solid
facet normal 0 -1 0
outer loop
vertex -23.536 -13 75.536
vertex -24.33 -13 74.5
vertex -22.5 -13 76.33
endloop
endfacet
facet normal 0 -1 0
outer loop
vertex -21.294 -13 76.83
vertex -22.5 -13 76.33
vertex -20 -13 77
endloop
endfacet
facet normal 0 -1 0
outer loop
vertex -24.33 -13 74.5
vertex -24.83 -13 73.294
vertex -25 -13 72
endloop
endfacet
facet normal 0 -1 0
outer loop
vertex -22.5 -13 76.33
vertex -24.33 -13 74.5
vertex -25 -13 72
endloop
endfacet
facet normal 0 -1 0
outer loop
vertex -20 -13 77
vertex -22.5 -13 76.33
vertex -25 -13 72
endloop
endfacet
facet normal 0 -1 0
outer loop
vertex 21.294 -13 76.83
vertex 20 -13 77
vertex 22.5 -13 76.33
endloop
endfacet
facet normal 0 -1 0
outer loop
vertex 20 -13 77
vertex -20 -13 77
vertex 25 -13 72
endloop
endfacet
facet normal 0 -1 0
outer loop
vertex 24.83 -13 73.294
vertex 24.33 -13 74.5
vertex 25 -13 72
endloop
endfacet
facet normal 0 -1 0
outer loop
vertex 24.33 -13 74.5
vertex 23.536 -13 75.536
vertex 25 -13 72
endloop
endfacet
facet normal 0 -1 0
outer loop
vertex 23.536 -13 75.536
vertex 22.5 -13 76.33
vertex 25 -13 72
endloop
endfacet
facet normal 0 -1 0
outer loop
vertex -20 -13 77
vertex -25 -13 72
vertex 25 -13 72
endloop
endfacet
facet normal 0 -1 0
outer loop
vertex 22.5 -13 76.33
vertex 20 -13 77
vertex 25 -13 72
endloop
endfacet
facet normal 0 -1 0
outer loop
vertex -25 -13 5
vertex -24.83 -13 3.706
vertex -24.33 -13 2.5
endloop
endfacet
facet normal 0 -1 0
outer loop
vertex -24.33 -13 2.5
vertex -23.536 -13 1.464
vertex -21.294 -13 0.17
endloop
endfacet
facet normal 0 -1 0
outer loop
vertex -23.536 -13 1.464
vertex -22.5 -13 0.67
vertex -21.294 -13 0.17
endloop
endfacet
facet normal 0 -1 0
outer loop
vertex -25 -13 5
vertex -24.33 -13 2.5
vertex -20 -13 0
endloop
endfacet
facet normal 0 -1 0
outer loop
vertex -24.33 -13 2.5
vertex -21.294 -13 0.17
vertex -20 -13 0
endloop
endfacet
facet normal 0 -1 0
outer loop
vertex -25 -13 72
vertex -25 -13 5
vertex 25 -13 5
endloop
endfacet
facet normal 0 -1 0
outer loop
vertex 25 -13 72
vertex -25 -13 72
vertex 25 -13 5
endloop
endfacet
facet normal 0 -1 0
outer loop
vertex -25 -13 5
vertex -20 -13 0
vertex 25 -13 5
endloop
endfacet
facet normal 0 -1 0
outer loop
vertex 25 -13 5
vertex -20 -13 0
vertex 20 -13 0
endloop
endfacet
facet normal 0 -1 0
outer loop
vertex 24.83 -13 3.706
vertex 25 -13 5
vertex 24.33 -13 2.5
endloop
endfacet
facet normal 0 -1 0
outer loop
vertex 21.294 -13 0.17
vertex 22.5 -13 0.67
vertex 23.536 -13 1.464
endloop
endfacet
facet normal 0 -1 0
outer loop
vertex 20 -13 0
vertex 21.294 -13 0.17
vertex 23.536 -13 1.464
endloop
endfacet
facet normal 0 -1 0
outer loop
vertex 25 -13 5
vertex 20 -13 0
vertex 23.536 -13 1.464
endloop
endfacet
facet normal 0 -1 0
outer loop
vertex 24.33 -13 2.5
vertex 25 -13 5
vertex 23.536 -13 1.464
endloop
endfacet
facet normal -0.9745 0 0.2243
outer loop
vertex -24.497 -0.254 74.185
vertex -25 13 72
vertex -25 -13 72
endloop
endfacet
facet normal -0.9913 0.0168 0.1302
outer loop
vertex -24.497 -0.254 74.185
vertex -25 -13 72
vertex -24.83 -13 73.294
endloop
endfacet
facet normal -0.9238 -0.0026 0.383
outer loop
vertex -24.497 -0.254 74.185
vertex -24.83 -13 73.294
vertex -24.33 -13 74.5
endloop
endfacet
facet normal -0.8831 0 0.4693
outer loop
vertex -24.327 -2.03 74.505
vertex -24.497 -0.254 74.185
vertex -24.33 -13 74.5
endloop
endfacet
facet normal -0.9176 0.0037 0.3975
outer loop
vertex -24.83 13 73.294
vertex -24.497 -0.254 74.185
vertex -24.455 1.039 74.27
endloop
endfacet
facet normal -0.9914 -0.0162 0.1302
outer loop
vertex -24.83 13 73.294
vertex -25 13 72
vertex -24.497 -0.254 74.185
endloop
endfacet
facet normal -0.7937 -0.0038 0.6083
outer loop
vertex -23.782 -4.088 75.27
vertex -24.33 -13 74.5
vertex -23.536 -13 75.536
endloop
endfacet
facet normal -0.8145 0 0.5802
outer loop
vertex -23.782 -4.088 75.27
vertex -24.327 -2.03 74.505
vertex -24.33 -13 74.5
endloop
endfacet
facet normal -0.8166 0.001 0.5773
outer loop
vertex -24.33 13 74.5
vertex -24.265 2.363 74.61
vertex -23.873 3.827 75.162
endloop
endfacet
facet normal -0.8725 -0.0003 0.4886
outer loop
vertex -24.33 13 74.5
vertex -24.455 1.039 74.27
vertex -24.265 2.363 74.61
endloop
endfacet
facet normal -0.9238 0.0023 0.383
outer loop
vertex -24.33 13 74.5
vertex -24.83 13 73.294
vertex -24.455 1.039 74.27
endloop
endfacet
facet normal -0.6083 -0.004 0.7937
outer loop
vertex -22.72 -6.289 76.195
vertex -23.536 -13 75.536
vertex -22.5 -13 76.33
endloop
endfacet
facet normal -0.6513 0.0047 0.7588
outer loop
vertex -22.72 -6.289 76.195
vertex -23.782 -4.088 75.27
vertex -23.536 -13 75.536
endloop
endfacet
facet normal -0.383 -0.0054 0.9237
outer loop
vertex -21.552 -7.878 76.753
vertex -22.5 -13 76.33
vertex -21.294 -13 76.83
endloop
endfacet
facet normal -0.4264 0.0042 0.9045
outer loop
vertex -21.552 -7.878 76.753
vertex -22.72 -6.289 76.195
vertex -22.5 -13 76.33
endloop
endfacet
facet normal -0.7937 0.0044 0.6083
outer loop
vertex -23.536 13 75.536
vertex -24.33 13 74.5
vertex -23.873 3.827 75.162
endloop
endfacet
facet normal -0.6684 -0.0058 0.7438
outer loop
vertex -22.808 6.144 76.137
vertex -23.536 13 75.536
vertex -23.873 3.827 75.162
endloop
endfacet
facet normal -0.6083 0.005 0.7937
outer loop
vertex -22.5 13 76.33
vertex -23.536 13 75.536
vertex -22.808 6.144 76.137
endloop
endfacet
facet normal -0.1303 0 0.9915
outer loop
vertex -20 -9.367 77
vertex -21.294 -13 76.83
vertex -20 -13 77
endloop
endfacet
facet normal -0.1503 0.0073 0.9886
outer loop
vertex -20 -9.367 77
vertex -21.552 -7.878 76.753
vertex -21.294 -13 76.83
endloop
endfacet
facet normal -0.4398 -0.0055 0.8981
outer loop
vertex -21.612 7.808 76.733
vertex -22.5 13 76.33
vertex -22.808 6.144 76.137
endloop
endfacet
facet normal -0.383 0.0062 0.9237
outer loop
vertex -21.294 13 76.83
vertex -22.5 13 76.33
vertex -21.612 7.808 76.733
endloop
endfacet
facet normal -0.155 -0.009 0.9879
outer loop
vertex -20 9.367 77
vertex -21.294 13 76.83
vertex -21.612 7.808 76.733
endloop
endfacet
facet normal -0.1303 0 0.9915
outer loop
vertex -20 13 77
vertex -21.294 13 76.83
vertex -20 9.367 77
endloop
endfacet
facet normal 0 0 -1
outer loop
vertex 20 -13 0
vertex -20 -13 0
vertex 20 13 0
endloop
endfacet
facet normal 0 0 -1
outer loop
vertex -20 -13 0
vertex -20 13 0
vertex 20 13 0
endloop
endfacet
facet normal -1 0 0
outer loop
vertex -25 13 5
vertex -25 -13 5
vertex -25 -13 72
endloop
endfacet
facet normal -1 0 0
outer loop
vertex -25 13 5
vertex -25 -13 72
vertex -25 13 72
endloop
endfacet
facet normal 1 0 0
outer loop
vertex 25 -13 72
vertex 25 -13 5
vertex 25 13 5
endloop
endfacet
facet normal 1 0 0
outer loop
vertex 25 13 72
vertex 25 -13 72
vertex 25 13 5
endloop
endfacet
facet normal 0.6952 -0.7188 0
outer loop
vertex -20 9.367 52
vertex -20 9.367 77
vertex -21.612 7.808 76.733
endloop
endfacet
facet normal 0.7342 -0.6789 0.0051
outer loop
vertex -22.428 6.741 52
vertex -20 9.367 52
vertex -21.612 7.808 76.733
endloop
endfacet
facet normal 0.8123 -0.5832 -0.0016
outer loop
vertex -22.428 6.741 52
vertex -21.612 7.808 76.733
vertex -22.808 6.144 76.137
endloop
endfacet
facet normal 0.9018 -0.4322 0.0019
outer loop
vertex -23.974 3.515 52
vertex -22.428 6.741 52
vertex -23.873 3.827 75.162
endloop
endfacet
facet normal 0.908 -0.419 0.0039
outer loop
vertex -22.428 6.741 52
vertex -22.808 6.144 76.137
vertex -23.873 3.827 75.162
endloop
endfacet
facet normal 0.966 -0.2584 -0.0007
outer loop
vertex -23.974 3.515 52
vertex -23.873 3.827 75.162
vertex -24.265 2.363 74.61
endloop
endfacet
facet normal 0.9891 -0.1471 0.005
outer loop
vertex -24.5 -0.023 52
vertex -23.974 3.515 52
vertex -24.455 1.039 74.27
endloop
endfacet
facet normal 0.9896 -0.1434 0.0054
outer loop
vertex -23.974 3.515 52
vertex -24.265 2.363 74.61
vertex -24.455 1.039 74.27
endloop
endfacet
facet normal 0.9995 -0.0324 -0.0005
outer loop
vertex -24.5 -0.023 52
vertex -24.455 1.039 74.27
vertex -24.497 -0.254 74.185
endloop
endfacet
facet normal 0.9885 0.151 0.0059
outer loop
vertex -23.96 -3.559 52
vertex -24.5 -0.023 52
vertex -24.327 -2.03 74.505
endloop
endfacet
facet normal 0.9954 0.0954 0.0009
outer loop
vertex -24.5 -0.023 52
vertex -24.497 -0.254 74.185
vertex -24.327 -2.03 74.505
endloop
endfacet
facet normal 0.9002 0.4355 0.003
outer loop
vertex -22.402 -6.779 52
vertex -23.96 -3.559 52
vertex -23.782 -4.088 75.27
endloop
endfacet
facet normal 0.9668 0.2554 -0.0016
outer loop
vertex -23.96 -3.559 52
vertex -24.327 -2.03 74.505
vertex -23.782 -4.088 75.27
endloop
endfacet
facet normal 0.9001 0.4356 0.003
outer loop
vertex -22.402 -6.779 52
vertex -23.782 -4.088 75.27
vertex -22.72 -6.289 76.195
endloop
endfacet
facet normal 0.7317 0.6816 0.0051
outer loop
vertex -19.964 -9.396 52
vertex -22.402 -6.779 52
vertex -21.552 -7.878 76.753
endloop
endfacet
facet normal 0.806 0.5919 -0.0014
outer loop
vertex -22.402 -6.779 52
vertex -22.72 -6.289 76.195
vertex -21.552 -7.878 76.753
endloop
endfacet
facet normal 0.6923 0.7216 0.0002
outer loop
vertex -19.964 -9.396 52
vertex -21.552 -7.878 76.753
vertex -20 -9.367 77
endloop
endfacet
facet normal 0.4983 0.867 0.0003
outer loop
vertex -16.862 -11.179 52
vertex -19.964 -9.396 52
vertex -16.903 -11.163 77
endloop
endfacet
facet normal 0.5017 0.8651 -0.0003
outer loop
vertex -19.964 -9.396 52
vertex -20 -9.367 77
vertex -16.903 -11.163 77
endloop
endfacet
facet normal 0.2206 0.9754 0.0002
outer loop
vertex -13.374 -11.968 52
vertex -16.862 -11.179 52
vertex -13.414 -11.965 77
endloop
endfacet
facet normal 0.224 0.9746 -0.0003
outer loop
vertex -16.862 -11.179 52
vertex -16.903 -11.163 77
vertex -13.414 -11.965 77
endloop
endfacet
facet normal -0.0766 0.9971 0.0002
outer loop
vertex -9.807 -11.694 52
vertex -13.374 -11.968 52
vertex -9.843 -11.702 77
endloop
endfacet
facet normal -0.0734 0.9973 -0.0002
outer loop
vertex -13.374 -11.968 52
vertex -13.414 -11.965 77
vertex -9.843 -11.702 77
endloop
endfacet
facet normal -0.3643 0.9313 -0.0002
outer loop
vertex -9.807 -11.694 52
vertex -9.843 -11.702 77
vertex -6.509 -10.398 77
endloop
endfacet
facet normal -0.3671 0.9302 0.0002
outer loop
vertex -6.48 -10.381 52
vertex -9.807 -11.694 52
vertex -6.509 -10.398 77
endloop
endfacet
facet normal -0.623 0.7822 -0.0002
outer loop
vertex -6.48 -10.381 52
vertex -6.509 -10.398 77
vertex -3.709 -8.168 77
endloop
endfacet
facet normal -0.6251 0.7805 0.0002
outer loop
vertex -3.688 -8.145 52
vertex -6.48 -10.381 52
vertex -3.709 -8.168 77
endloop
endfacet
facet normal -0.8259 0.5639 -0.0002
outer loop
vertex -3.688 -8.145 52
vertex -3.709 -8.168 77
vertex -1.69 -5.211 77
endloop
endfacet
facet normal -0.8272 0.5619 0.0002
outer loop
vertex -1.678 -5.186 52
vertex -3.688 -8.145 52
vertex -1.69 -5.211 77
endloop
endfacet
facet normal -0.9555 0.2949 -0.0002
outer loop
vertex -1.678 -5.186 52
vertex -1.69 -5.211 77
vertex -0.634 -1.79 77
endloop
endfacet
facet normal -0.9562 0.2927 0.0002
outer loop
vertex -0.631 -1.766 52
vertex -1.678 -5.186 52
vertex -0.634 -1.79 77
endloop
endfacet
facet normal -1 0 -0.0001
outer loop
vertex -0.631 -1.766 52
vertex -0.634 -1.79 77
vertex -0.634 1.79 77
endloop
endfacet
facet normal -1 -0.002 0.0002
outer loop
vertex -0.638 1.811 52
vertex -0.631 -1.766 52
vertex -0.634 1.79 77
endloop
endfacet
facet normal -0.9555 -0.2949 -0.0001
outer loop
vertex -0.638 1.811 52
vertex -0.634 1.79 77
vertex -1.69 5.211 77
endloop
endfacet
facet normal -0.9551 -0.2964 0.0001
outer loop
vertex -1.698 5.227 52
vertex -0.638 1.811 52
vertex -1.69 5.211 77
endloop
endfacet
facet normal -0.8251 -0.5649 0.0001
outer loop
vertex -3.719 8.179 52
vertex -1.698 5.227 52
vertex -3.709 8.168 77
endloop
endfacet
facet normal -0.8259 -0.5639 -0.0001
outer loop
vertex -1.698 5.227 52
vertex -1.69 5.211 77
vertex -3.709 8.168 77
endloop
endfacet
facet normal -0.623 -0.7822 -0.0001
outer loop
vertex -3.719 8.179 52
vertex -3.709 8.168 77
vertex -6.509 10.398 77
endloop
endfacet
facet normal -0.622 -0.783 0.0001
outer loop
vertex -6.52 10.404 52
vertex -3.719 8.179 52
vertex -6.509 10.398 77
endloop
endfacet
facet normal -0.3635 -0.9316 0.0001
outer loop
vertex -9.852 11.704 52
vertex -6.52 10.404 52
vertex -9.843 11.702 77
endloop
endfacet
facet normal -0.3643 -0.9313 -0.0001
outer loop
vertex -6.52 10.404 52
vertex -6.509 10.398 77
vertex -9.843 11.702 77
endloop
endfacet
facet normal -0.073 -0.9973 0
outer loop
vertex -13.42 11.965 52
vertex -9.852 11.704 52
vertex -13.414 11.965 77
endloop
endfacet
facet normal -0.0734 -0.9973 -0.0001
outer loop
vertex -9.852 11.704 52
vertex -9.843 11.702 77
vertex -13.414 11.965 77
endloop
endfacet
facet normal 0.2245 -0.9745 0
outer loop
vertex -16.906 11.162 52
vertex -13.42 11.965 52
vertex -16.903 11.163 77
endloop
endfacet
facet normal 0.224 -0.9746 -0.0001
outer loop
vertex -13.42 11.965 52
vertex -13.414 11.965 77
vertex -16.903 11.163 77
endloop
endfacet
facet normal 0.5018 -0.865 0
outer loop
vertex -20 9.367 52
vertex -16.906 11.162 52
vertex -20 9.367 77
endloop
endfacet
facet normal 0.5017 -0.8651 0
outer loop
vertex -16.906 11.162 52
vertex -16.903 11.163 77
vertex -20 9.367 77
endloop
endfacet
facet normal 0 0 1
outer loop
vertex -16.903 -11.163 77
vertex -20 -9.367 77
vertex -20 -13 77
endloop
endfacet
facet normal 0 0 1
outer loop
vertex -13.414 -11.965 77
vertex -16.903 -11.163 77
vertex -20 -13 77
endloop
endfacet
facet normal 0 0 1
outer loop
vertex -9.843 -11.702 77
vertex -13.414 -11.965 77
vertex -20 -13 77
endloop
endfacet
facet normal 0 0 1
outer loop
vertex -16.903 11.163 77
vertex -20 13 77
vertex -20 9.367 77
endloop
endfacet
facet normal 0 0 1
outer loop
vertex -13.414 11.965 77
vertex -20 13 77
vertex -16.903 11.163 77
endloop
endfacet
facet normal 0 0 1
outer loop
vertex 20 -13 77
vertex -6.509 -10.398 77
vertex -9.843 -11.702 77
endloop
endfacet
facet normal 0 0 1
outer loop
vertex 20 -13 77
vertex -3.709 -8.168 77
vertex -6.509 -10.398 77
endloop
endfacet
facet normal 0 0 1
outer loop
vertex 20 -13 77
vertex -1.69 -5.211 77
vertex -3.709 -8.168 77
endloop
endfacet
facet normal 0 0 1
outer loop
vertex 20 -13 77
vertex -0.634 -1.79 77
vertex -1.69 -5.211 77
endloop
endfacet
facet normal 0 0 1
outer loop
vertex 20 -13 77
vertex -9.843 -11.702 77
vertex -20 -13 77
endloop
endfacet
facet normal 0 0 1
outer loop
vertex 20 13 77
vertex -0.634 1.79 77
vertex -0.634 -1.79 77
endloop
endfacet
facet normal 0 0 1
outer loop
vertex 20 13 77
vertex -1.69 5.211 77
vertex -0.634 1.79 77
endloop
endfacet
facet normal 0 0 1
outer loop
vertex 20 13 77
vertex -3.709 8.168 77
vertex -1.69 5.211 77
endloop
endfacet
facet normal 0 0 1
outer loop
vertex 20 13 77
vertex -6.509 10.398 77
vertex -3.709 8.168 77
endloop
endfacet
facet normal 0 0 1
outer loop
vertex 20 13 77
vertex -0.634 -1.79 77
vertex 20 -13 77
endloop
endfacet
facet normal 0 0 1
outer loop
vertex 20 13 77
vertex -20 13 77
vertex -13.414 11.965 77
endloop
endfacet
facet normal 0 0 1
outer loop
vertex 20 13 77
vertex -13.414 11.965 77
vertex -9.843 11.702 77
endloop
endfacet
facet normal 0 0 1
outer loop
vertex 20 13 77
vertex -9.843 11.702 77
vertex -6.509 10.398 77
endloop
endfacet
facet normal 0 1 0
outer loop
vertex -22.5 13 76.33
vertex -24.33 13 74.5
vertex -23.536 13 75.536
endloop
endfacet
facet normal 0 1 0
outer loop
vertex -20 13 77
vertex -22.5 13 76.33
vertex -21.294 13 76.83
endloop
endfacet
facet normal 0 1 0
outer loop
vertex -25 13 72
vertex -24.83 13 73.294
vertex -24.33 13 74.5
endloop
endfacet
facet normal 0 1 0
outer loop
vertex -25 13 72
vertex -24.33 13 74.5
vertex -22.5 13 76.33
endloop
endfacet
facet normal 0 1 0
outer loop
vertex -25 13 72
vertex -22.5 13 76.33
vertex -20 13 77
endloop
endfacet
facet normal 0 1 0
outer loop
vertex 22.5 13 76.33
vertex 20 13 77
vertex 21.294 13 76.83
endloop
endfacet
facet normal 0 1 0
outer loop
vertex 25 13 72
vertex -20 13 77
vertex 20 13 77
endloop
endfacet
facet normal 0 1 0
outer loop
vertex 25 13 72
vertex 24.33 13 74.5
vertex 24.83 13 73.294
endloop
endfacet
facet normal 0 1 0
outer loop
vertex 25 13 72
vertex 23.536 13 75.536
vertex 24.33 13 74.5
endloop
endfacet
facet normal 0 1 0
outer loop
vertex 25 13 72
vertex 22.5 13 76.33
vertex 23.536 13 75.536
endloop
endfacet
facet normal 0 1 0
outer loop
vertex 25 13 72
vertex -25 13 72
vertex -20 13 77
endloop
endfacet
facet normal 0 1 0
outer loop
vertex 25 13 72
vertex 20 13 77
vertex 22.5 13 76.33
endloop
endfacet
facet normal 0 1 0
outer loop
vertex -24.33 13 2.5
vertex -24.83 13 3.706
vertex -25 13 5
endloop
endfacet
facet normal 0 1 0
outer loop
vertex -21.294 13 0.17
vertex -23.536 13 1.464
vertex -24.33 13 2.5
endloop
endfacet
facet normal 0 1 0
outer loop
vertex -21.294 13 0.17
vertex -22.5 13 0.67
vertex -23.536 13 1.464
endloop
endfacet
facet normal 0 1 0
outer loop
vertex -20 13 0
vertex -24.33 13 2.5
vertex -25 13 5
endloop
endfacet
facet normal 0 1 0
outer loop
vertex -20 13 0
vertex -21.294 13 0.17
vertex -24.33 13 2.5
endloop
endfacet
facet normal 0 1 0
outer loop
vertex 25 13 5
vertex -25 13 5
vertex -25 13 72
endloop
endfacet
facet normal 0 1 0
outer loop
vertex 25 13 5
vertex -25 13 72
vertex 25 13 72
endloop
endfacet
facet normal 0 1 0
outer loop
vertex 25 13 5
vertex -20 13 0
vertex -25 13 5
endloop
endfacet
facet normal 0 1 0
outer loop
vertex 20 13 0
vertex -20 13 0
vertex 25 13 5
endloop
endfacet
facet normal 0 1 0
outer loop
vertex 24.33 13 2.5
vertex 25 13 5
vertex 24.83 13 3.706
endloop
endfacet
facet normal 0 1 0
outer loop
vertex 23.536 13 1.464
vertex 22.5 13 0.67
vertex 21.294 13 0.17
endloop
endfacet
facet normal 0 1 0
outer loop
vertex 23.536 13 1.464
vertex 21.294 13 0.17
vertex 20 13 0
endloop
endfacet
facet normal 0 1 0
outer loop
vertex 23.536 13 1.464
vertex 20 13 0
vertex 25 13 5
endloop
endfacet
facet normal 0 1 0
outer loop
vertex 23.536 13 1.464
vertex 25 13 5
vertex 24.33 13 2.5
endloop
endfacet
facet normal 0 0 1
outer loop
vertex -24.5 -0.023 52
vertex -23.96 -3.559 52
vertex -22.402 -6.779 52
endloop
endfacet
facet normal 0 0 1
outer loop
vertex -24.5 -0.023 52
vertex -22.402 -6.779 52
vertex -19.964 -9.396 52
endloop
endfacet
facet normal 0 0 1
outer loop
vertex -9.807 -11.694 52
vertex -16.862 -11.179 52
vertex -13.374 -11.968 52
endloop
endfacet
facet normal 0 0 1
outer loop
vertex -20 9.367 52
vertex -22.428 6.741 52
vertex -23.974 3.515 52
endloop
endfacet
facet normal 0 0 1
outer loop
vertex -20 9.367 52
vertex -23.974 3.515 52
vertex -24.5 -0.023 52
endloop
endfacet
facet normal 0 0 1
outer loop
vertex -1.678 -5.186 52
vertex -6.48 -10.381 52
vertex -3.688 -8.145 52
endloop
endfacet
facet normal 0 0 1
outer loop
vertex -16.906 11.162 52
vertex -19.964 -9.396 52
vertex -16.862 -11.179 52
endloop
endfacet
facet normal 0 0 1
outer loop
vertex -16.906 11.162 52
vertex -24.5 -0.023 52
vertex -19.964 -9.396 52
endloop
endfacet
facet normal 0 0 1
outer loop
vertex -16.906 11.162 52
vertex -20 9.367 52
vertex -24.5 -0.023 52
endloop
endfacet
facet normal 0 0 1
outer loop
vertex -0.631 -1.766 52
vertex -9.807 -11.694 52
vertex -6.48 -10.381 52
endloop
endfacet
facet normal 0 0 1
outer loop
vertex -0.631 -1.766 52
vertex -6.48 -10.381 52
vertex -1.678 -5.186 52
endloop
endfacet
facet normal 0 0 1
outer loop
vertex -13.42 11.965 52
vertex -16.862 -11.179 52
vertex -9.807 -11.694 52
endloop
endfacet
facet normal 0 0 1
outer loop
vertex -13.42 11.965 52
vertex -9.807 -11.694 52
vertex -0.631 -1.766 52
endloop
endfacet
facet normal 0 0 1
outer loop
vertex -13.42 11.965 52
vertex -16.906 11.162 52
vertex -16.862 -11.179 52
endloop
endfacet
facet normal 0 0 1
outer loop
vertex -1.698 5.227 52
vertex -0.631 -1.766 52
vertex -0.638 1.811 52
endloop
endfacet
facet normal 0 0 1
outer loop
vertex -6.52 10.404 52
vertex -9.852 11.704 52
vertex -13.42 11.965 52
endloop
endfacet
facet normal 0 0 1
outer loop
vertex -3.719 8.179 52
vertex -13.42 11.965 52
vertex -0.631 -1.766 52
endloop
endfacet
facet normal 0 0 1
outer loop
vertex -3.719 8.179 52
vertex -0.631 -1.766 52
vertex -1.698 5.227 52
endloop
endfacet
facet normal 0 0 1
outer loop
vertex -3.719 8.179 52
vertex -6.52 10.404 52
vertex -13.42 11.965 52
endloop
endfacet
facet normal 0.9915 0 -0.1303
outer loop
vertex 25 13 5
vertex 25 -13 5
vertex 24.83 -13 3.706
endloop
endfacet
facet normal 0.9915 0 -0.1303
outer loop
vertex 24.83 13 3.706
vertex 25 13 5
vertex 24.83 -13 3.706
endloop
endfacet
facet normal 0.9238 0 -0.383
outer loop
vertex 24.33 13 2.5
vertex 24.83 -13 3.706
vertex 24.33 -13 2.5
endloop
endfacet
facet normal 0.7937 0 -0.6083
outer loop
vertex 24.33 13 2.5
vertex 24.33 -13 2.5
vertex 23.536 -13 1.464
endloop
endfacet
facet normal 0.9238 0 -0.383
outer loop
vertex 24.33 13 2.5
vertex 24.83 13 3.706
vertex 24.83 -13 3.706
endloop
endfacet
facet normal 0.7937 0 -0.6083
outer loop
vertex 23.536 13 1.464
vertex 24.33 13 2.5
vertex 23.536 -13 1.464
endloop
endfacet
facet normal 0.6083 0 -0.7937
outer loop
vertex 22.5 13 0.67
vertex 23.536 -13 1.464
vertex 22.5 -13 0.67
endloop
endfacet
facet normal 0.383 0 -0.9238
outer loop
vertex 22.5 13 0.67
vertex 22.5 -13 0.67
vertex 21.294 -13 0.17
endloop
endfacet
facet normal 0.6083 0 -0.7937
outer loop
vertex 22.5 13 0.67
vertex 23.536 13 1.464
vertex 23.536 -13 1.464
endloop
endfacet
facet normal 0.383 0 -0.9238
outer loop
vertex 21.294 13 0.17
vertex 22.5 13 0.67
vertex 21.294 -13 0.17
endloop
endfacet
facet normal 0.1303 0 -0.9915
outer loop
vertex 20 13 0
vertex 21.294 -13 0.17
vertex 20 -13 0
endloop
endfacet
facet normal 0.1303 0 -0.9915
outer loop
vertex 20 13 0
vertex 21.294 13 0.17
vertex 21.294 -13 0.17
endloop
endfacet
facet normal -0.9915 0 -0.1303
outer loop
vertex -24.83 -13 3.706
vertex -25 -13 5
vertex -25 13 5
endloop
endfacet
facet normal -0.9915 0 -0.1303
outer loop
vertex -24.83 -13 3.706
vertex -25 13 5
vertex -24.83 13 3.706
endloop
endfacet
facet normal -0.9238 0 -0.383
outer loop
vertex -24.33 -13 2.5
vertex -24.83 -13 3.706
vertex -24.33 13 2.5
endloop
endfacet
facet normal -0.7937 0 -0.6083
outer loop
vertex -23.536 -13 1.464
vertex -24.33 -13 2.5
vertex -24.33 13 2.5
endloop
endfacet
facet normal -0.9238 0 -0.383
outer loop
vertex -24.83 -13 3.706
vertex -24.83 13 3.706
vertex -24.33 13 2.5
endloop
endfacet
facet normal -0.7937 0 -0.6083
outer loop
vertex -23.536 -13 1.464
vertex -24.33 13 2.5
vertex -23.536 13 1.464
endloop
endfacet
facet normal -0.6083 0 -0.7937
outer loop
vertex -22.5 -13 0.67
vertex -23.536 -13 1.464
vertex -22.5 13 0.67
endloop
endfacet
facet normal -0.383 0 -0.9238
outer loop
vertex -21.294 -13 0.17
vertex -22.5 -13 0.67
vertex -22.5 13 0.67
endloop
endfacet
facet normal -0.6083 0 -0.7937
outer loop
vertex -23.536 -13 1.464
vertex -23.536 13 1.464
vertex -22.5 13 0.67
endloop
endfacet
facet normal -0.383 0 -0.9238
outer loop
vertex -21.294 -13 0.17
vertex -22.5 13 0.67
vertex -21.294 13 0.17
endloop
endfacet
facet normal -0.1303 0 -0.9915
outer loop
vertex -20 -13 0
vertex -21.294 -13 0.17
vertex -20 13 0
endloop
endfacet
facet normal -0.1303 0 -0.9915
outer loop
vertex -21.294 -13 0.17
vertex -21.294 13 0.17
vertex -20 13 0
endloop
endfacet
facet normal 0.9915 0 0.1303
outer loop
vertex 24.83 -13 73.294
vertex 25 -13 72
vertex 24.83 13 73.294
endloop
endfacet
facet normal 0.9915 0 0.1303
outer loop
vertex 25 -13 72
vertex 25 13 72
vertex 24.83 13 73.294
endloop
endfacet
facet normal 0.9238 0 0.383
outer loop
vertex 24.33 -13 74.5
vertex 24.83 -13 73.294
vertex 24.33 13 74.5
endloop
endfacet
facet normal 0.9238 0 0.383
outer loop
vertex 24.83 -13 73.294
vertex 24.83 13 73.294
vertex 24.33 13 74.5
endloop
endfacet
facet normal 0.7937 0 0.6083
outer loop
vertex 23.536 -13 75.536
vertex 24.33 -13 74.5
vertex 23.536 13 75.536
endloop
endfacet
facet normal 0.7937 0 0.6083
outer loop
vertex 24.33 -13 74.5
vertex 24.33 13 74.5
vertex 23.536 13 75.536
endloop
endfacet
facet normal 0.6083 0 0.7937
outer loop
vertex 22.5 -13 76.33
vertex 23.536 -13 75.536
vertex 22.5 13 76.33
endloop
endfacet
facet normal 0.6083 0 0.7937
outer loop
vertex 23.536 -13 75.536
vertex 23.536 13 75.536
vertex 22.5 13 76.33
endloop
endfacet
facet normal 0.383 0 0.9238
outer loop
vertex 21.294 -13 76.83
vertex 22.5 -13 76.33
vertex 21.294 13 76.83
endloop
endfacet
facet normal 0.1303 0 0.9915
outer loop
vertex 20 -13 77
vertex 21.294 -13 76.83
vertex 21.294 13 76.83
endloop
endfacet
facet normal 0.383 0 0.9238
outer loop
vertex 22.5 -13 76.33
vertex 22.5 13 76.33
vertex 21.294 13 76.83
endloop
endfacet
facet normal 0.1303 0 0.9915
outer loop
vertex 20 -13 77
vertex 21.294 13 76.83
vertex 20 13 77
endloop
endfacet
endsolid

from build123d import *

# Parameters (mm, degrees)
F0_W     = 50
F0_H     = 26
F1_DEPTH = 77
F2_R     = 5
F4_DEPTH = 25


with BuildPart() as f1:
    # F0 (on Top) → F1 (new body)
    with BuildSketch(Plane.XY):
        Rectangle(F0_W, F0_H)
    extrude(amount=F1_DEPTH)

    # F2
    f2_edges = [f1.edges().sort_by_distance(p)[0] for p in [
        (-25, 0, 0),
        (25, 0, 0),
        (-25, 0, 77),
        (25, 0, 77),
    ]]
    fillet(f2_edges, radius=F2_R)

    # F3 (on face) → F4 (cut)
    with BuildSketch(Plane.XY.offset(77)):
        with BuildLine():
            ThreePointArc((-20, -9.3674969976), (-7.3038475773, -10.8166538264), (-0.5, 0))
            ThreePointArc((-0.5, 0), (-7.3038475773, 10.8166538264), (-20, 9.3674969976))
            Line((-20, 9.3674969976), (-20, -9.3674969976))
        make_face()
        with BuildLine():
            Line((-20, -9.3674969976), (-20, 9.3674969976))
            ThreePointArc((-20, 9.3674969976), (-24.5, 0), (-20, -9.3674969976))
        make_face()
    extrude(amount=-F4_DEPTH, mode=Mode.SUBTRACT)


solid = f1.part
